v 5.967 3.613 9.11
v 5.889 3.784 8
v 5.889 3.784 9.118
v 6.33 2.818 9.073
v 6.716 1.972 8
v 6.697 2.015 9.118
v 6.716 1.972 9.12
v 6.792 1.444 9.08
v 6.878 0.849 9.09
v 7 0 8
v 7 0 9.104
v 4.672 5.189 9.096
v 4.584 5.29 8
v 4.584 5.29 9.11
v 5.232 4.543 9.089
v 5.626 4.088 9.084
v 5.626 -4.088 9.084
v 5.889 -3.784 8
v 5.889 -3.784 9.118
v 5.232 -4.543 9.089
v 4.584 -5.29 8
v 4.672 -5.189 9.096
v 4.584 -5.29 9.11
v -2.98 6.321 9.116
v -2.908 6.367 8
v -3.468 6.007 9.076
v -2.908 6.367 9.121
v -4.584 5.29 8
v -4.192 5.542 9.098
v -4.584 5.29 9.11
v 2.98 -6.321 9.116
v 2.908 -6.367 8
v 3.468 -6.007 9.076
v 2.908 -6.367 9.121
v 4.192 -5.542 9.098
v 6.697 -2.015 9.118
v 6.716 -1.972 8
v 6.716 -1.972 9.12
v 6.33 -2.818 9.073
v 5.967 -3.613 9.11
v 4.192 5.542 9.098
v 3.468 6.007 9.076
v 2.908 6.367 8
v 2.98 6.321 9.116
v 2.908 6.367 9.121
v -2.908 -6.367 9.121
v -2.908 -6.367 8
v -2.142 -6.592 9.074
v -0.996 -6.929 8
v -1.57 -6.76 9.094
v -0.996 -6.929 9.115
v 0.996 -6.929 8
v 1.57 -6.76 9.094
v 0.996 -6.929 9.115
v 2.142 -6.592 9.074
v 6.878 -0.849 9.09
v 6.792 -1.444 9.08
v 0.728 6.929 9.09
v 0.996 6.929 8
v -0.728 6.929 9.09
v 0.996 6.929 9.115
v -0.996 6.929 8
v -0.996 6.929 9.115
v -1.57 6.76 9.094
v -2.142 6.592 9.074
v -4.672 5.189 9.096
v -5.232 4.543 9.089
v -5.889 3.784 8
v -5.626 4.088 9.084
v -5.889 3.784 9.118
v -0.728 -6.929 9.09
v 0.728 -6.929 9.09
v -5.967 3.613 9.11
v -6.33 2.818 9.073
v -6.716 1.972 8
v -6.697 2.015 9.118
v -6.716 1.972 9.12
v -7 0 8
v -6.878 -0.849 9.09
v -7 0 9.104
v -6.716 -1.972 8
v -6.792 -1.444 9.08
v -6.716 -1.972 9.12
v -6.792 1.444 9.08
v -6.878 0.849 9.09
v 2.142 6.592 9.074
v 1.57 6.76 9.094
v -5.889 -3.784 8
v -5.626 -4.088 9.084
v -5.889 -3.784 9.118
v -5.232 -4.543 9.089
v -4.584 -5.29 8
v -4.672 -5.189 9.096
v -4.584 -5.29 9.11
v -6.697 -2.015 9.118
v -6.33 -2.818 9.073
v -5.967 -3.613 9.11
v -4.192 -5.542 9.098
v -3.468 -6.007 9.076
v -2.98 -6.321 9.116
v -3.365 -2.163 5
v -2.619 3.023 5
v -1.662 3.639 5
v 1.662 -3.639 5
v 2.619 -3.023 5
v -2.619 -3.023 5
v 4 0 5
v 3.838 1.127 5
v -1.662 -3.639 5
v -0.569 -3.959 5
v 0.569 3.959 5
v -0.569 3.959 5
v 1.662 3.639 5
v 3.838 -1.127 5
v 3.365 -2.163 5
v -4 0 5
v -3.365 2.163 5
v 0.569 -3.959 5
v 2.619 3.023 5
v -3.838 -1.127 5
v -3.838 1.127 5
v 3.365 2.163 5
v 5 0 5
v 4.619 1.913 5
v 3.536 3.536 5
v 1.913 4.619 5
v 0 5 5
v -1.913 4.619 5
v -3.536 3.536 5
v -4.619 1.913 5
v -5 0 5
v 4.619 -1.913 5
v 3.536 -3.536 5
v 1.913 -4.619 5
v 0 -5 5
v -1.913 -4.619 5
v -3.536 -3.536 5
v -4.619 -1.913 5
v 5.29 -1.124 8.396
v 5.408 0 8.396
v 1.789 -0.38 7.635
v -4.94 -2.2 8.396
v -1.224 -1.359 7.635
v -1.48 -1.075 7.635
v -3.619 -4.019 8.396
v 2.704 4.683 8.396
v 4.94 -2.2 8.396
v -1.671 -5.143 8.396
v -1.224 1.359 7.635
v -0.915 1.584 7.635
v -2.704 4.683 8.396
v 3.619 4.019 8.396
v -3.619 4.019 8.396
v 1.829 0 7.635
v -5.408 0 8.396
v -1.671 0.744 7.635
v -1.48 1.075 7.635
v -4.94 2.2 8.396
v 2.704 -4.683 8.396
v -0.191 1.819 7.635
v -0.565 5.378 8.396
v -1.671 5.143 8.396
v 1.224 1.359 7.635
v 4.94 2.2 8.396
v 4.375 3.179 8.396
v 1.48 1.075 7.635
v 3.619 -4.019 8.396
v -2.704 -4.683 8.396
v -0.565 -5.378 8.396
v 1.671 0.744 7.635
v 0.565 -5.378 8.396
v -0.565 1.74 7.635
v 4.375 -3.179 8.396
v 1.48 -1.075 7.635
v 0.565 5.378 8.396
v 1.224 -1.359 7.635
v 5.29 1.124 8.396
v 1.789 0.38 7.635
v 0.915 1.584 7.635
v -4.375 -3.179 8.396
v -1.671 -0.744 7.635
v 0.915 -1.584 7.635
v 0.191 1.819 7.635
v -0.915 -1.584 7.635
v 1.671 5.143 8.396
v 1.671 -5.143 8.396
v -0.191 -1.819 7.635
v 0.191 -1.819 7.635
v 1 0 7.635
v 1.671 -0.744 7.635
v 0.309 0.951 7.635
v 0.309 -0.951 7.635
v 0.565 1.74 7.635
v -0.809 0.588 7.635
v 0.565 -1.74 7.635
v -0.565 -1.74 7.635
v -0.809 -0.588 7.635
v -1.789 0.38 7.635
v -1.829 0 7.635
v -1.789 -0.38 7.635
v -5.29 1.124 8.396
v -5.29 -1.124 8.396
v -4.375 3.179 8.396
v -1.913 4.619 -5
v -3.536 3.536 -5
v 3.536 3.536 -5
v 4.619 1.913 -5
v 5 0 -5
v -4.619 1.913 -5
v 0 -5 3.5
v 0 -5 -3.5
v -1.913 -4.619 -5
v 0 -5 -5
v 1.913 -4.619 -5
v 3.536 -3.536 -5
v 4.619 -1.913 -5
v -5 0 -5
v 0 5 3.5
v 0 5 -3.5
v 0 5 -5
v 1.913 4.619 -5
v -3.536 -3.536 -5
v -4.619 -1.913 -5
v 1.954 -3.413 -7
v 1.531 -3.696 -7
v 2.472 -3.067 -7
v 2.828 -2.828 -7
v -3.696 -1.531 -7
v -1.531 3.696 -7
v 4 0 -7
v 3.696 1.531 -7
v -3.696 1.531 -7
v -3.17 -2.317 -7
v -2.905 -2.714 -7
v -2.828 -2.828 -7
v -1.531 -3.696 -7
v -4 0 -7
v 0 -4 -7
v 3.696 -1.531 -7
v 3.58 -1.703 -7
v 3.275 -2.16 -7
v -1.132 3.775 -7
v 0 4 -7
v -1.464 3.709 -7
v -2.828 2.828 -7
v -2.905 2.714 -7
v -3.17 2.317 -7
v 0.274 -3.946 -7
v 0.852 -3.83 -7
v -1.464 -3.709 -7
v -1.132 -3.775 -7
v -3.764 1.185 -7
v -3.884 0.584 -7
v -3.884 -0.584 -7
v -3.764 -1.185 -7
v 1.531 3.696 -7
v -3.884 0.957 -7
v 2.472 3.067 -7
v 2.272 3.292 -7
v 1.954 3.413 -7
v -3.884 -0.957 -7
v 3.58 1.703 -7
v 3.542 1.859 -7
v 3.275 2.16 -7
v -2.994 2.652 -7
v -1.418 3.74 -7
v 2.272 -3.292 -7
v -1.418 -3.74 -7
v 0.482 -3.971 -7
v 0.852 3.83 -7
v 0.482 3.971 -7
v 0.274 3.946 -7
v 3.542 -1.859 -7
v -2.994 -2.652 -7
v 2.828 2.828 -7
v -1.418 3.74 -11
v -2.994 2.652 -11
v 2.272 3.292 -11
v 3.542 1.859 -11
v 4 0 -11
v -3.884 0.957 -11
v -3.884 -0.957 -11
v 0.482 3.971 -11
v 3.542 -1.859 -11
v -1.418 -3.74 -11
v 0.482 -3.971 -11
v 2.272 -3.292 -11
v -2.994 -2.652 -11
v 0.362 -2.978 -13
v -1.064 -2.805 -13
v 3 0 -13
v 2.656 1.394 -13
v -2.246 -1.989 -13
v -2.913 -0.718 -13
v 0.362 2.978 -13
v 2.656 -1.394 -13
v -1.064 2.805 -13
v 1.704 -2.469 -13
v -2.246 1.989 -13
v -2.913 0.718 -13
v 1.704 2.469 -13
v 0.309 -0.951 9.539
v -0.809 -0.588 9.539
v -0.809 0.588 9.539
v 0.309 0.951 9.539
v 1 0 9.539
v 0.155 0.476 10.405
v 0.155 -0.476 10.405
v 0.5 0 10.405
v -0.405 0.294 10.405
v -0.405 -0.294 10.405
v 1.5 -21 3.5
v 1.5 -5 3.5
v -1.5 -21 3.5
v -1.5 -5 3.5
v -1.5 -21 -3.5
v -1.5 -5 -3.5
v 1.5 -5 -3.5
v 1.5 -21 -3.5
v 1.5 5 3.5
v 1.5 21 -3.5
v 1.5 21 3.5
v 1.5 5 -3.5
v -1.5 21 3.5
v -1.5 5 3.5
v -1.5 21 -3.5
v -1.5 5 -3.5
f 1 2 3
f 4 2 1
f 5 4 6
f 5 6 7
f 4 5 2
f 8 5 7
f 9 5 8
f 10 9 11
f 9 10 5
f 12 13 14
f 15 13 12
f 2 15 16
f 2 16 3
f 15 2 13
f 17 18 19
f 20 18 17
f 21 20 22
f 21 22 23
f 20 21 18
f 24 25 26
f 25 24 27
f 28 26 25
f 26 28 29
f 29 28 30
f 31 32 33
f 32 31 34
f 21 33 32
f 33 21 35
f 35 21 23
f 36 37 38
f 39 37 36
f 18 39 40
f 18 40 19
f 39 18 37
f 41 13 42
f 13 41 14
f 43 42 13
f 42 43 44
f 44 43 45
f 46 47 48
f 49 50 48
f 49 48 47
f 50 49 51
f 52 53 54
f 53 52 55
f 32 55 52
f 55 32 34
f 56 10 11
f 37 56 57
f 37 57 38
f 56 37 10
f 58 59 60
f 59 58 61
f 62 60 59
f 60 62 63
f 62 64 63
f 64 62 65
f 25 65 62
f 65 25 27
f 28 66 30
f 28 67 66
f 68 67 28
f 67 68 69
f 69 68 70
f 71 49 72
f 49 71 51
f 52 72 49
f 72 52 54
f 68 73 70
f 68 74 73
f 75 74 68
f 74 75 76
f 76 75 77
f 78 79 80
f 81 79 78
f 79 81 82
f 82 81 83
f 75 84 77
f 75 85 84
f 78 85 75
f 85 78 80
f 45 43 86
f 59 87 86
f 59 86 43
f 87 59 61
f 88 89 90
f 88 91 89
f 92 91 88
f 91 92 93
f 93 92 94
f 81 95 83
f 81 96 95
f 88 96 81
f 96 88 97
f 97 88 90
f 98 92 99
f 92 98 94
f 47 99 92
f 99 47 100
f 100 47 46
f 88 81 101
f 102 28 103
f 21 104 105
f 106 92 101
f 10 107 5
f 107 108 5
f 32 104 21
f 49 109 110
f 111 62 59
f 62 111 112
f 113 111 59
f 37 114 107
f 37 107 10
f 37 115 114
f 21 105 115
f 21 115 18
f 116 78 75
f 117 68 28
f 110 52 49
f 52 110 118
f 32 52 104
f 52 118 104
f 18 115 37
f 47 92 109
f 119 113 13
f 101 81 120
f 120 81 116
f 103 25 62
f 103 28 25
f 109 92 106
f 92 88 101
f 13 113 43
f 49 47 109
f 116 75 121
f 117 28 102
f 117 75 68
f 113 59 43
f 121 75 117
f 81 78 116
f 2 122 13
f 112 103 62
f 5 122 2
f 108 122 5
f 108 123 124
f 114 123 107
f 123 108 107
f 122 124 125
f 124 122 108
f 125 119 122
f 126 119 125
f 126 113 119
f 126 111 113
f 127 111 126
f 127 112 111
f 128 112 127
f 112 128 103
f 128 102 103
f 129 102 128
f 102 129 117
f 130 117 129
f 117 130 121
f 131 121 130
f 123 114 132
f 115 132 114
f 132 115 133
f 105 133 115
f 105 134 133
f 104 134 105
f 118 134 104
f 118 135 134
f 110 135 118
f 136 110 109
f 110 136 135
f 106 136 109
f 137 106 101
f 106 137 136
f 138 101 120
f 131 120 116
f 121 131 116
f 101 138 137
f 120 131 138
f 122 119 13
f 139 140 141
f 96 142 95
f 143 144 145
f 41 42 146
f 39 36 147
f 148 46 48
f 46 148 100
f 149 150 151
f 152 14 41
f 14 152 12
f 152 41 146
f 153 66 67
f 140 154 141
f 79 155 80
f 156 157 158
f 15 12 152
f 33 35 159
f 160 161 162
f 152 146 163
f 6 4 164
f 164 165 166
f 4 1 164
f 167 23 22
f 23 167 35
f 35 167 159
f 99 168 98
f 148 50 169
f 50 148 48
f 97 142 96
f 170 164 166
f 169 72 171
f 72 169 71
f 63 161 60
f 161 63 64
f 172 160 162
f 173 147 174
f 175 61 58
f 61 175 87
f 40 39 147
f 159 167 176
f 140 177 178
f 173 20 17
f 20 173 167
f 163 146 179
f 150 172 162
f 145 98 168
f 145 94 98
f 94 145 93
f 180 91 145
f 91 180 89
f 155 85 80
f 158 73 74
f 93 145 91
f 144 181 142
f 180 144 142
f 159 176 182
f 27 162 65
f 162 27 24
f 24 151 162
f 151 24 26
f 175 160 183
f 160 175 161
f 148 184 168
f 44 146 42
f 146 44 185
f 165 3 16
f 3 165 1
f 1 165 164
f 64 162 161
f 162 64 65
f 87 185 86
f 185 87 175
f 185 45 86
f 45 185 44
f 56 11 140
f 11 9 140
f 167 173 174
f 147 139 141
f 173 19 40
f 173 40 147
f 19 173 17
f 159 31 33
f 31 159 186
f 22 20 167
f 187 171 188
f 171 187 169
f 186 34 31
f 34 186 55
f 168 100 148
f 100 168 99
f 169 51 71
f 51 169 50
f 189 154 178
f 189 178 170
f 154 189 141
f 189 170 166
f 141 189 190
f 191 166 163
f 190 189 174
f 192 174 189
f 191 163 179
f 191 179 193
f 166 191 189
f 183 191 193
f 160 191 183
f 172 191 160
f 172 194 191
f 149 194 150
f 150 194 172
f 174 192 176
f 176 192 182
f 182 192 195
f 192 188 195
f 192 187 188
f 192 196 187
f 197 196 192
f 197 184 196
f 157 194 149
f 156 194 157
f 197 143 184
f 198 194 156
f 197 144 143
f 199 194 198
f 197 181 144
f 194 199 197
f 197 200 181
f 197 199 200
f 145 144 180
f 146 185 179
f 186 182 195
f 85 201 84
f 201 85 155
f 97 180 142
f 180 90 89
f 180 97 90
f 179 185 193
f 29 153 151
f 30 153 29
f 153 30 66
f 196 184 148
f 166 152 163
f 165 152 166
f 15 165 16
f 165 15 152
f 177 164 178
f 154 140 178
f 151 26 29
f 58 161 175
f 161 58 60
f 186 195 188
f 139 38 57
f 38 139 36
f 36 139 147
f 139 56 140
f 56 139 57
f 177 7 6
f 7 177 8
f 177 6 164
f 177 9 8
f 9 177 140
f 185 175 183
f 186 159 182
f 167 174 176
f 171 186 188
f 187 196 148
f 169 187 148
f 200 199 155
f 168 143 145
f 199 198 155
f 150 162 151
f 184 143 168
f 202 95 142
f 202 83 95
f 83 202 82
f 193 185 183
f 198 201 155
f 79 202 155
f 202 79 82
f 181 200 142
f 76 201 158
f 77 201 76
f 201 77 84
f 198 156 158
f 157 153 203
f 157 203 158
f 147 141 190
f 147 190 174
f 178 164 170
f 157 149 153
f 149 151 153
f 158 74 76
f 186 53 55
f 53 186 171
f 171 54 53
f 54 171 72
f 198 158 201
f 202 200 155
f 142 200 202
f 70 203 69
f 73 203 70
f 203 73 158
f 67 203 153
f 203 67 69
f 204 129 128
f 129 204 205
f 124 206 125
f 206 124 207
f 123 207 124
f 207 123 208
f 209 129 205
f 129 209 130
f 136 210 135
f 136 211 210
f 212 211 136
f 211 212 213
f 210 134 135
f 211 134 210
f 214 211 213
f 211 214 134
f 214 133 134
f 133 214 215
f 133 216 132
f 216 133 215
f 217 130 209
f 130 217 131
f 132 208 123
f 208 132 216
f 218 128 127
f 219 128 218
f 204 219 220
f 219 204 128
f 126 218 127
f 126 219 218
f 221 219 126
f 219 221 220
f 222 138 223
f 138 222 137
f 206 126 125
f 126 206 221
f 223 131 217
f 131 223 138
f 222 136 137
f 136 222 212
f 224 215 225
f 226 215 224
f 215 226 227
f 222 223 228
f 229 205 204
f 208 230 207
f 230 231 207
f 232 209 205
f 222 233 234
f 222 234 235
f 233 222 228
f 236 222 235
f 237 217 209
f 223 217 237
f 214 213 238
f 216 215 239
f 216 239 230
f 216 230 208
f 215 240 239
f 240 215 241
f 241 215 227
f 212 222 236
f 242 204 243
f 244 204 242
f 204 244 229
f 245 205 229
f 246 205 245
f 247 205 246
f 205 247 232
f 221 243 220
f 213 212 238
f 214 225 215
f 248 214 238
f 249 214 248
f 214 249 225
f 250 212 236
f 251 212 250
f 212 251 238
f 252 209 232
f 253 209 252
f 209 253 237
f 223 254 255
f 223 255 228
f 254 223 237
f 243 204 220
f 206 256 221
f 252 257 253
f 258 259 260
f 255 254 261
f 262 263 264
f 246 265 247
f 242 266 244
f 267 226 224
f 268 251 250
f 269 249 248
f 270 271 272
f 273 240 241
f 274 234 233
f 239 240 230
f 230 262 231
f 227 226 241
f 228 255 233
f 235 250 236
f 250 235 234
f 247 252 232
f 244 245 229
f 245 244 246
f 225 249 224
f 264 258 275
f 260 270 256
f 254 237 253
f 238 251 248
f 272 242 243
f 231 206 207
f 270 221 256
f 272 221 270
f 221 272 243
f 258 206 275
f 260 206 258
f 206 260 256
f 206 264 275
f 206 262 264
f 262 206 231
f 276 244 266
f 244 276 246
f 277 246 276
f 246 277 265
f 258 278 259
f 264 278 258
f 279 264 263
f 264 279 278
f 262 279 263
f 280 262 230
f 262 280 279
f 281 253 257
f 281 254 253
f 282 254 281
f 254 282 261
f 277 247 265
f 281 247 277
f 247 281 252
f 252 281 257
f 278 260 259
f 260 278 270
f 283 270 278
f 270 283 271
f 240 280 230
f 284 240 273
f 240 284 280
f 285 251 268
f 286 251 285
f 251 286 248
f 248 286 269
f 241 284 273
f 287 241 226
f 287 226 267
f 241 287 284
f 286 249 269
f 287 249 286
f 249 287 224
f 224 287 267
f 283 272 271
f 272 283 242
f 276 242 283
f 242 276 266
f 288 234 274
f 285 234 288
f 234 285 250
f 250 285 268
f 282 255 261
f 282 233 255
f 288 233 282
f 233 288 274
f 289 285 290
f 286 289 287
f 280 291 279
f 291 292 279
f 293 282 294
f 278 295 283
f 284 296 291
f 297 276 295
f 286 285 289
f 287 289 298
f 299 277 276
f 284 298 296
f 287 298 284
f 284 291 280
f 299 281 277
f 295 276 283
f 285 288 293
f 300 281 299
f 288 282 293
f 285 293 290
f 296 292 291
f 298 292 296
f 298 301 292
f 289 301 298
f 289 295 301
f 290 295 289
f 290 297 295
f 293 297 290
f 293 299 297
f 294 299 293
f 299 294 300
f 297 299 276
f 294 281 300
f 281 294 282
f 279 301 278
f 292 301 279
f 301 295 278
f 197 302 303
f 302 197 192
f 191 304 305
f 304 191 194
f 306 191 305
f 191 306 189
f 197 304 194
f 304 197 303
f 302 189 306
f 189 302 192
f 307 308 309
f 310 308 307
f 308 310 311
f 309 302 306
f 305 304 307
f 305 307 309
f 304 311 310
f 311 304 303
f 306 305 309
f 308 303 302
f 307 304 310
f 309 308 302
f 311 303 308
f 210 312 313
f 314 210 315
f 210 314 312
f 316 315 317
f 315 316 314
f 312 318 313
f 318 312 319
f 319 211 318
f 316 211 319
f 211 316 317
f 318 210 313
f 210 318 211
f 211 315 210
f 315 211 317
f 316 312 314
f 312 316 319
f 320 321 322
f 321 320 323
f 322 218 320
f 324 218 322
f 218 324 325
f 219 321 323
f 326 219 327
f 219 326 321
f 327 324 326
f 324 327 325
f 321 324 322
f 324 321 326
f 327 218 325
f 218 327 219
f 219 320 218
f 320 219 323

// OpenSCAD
$unit = 10;
$heightFactor = 1;
$solarPanels = 2;
$dishInsetFactor = 2.5;
$radiusDishFactor = 1.4;

$height = $unit * $heightFactor;

$radius = $unit/2;
$radius2 = $radius*0.8;
$radius3 = $radius*0.6;

$radiusBig = $radius*$radiusDishFactor;
$radiusSphere = $radiusBig * $dishInsetFactor;

$angle = asin( $radiusBig / $radiusSphere ) * 2;
$shpereOffset = $radiusSphere * cos( $angle * 0.5 );
$antennaOffset = $height/2 + $unit*0.4 - ( $radiusSphere - $shpereOffset );


// Dish
color( "#EEE" ){
    translate([0,0,$height/2+$unit*0.4]) {
        
        difference() {
           
           union() {
                cylinder(h=$unit*0.2, r=$radiusBig, center=true);
                translate([0,0,$unit*-0.4]) {
                    cylinder(h=$unit*0.3, r1=$radius2, r2=$radiusBig, center=false);
                }
            } 
            translate([0,0,$shpereOffset]) {
                sphere($radiusSphere);
            }
        }
    }
    
}


// black satellite elements
color( "#555" ) { 
    
    // big part
    union() {
        cylinder(h=$height, r=$radius, center=true);
        translate([0,0,$height/-2 - $unit*0.2]) {
            cylinder(h=$unit*0.2, r1=$radius2, r2=$radius, center=false);
        }
    }
    
    // small part
    translate([0,0,$height/-2 - $unit*0.4]) {
        union() {
            cylinder(h=$unit*0.4, r=$radius2, center=true);
            translate([0,0,$unit*-0.4]) {
                cylinder(h=$unit*0.2, r1=$radius3, r2=$radius2, center=false);
            }
        }
    }
}

// wood elements
color( "#DCB579" ) { 
    
    // dish antenna
    translate([0,0,$antennaOffset]) {
        union() {
            cylinder( h=$unit*0.2, r=$radius*0.2, center=false );
            translate([0,0,$unit*0.2]) {
                sphere($radius*0.2);
            }
        }
    }
    
    // solar panels
    for(panelNumber = [1 : 1 : $solarPanels]){
        
        deg_a = 360 / $solarPanels * panelNumber;
        
        rotate(a = deg_a) { 
            translate( [0,$radius + $unit*0.8,0] ){
                cube([$unit*0.3,$unit*1.6,$unit*0.7],true);
            }
        }
    }

 
}
